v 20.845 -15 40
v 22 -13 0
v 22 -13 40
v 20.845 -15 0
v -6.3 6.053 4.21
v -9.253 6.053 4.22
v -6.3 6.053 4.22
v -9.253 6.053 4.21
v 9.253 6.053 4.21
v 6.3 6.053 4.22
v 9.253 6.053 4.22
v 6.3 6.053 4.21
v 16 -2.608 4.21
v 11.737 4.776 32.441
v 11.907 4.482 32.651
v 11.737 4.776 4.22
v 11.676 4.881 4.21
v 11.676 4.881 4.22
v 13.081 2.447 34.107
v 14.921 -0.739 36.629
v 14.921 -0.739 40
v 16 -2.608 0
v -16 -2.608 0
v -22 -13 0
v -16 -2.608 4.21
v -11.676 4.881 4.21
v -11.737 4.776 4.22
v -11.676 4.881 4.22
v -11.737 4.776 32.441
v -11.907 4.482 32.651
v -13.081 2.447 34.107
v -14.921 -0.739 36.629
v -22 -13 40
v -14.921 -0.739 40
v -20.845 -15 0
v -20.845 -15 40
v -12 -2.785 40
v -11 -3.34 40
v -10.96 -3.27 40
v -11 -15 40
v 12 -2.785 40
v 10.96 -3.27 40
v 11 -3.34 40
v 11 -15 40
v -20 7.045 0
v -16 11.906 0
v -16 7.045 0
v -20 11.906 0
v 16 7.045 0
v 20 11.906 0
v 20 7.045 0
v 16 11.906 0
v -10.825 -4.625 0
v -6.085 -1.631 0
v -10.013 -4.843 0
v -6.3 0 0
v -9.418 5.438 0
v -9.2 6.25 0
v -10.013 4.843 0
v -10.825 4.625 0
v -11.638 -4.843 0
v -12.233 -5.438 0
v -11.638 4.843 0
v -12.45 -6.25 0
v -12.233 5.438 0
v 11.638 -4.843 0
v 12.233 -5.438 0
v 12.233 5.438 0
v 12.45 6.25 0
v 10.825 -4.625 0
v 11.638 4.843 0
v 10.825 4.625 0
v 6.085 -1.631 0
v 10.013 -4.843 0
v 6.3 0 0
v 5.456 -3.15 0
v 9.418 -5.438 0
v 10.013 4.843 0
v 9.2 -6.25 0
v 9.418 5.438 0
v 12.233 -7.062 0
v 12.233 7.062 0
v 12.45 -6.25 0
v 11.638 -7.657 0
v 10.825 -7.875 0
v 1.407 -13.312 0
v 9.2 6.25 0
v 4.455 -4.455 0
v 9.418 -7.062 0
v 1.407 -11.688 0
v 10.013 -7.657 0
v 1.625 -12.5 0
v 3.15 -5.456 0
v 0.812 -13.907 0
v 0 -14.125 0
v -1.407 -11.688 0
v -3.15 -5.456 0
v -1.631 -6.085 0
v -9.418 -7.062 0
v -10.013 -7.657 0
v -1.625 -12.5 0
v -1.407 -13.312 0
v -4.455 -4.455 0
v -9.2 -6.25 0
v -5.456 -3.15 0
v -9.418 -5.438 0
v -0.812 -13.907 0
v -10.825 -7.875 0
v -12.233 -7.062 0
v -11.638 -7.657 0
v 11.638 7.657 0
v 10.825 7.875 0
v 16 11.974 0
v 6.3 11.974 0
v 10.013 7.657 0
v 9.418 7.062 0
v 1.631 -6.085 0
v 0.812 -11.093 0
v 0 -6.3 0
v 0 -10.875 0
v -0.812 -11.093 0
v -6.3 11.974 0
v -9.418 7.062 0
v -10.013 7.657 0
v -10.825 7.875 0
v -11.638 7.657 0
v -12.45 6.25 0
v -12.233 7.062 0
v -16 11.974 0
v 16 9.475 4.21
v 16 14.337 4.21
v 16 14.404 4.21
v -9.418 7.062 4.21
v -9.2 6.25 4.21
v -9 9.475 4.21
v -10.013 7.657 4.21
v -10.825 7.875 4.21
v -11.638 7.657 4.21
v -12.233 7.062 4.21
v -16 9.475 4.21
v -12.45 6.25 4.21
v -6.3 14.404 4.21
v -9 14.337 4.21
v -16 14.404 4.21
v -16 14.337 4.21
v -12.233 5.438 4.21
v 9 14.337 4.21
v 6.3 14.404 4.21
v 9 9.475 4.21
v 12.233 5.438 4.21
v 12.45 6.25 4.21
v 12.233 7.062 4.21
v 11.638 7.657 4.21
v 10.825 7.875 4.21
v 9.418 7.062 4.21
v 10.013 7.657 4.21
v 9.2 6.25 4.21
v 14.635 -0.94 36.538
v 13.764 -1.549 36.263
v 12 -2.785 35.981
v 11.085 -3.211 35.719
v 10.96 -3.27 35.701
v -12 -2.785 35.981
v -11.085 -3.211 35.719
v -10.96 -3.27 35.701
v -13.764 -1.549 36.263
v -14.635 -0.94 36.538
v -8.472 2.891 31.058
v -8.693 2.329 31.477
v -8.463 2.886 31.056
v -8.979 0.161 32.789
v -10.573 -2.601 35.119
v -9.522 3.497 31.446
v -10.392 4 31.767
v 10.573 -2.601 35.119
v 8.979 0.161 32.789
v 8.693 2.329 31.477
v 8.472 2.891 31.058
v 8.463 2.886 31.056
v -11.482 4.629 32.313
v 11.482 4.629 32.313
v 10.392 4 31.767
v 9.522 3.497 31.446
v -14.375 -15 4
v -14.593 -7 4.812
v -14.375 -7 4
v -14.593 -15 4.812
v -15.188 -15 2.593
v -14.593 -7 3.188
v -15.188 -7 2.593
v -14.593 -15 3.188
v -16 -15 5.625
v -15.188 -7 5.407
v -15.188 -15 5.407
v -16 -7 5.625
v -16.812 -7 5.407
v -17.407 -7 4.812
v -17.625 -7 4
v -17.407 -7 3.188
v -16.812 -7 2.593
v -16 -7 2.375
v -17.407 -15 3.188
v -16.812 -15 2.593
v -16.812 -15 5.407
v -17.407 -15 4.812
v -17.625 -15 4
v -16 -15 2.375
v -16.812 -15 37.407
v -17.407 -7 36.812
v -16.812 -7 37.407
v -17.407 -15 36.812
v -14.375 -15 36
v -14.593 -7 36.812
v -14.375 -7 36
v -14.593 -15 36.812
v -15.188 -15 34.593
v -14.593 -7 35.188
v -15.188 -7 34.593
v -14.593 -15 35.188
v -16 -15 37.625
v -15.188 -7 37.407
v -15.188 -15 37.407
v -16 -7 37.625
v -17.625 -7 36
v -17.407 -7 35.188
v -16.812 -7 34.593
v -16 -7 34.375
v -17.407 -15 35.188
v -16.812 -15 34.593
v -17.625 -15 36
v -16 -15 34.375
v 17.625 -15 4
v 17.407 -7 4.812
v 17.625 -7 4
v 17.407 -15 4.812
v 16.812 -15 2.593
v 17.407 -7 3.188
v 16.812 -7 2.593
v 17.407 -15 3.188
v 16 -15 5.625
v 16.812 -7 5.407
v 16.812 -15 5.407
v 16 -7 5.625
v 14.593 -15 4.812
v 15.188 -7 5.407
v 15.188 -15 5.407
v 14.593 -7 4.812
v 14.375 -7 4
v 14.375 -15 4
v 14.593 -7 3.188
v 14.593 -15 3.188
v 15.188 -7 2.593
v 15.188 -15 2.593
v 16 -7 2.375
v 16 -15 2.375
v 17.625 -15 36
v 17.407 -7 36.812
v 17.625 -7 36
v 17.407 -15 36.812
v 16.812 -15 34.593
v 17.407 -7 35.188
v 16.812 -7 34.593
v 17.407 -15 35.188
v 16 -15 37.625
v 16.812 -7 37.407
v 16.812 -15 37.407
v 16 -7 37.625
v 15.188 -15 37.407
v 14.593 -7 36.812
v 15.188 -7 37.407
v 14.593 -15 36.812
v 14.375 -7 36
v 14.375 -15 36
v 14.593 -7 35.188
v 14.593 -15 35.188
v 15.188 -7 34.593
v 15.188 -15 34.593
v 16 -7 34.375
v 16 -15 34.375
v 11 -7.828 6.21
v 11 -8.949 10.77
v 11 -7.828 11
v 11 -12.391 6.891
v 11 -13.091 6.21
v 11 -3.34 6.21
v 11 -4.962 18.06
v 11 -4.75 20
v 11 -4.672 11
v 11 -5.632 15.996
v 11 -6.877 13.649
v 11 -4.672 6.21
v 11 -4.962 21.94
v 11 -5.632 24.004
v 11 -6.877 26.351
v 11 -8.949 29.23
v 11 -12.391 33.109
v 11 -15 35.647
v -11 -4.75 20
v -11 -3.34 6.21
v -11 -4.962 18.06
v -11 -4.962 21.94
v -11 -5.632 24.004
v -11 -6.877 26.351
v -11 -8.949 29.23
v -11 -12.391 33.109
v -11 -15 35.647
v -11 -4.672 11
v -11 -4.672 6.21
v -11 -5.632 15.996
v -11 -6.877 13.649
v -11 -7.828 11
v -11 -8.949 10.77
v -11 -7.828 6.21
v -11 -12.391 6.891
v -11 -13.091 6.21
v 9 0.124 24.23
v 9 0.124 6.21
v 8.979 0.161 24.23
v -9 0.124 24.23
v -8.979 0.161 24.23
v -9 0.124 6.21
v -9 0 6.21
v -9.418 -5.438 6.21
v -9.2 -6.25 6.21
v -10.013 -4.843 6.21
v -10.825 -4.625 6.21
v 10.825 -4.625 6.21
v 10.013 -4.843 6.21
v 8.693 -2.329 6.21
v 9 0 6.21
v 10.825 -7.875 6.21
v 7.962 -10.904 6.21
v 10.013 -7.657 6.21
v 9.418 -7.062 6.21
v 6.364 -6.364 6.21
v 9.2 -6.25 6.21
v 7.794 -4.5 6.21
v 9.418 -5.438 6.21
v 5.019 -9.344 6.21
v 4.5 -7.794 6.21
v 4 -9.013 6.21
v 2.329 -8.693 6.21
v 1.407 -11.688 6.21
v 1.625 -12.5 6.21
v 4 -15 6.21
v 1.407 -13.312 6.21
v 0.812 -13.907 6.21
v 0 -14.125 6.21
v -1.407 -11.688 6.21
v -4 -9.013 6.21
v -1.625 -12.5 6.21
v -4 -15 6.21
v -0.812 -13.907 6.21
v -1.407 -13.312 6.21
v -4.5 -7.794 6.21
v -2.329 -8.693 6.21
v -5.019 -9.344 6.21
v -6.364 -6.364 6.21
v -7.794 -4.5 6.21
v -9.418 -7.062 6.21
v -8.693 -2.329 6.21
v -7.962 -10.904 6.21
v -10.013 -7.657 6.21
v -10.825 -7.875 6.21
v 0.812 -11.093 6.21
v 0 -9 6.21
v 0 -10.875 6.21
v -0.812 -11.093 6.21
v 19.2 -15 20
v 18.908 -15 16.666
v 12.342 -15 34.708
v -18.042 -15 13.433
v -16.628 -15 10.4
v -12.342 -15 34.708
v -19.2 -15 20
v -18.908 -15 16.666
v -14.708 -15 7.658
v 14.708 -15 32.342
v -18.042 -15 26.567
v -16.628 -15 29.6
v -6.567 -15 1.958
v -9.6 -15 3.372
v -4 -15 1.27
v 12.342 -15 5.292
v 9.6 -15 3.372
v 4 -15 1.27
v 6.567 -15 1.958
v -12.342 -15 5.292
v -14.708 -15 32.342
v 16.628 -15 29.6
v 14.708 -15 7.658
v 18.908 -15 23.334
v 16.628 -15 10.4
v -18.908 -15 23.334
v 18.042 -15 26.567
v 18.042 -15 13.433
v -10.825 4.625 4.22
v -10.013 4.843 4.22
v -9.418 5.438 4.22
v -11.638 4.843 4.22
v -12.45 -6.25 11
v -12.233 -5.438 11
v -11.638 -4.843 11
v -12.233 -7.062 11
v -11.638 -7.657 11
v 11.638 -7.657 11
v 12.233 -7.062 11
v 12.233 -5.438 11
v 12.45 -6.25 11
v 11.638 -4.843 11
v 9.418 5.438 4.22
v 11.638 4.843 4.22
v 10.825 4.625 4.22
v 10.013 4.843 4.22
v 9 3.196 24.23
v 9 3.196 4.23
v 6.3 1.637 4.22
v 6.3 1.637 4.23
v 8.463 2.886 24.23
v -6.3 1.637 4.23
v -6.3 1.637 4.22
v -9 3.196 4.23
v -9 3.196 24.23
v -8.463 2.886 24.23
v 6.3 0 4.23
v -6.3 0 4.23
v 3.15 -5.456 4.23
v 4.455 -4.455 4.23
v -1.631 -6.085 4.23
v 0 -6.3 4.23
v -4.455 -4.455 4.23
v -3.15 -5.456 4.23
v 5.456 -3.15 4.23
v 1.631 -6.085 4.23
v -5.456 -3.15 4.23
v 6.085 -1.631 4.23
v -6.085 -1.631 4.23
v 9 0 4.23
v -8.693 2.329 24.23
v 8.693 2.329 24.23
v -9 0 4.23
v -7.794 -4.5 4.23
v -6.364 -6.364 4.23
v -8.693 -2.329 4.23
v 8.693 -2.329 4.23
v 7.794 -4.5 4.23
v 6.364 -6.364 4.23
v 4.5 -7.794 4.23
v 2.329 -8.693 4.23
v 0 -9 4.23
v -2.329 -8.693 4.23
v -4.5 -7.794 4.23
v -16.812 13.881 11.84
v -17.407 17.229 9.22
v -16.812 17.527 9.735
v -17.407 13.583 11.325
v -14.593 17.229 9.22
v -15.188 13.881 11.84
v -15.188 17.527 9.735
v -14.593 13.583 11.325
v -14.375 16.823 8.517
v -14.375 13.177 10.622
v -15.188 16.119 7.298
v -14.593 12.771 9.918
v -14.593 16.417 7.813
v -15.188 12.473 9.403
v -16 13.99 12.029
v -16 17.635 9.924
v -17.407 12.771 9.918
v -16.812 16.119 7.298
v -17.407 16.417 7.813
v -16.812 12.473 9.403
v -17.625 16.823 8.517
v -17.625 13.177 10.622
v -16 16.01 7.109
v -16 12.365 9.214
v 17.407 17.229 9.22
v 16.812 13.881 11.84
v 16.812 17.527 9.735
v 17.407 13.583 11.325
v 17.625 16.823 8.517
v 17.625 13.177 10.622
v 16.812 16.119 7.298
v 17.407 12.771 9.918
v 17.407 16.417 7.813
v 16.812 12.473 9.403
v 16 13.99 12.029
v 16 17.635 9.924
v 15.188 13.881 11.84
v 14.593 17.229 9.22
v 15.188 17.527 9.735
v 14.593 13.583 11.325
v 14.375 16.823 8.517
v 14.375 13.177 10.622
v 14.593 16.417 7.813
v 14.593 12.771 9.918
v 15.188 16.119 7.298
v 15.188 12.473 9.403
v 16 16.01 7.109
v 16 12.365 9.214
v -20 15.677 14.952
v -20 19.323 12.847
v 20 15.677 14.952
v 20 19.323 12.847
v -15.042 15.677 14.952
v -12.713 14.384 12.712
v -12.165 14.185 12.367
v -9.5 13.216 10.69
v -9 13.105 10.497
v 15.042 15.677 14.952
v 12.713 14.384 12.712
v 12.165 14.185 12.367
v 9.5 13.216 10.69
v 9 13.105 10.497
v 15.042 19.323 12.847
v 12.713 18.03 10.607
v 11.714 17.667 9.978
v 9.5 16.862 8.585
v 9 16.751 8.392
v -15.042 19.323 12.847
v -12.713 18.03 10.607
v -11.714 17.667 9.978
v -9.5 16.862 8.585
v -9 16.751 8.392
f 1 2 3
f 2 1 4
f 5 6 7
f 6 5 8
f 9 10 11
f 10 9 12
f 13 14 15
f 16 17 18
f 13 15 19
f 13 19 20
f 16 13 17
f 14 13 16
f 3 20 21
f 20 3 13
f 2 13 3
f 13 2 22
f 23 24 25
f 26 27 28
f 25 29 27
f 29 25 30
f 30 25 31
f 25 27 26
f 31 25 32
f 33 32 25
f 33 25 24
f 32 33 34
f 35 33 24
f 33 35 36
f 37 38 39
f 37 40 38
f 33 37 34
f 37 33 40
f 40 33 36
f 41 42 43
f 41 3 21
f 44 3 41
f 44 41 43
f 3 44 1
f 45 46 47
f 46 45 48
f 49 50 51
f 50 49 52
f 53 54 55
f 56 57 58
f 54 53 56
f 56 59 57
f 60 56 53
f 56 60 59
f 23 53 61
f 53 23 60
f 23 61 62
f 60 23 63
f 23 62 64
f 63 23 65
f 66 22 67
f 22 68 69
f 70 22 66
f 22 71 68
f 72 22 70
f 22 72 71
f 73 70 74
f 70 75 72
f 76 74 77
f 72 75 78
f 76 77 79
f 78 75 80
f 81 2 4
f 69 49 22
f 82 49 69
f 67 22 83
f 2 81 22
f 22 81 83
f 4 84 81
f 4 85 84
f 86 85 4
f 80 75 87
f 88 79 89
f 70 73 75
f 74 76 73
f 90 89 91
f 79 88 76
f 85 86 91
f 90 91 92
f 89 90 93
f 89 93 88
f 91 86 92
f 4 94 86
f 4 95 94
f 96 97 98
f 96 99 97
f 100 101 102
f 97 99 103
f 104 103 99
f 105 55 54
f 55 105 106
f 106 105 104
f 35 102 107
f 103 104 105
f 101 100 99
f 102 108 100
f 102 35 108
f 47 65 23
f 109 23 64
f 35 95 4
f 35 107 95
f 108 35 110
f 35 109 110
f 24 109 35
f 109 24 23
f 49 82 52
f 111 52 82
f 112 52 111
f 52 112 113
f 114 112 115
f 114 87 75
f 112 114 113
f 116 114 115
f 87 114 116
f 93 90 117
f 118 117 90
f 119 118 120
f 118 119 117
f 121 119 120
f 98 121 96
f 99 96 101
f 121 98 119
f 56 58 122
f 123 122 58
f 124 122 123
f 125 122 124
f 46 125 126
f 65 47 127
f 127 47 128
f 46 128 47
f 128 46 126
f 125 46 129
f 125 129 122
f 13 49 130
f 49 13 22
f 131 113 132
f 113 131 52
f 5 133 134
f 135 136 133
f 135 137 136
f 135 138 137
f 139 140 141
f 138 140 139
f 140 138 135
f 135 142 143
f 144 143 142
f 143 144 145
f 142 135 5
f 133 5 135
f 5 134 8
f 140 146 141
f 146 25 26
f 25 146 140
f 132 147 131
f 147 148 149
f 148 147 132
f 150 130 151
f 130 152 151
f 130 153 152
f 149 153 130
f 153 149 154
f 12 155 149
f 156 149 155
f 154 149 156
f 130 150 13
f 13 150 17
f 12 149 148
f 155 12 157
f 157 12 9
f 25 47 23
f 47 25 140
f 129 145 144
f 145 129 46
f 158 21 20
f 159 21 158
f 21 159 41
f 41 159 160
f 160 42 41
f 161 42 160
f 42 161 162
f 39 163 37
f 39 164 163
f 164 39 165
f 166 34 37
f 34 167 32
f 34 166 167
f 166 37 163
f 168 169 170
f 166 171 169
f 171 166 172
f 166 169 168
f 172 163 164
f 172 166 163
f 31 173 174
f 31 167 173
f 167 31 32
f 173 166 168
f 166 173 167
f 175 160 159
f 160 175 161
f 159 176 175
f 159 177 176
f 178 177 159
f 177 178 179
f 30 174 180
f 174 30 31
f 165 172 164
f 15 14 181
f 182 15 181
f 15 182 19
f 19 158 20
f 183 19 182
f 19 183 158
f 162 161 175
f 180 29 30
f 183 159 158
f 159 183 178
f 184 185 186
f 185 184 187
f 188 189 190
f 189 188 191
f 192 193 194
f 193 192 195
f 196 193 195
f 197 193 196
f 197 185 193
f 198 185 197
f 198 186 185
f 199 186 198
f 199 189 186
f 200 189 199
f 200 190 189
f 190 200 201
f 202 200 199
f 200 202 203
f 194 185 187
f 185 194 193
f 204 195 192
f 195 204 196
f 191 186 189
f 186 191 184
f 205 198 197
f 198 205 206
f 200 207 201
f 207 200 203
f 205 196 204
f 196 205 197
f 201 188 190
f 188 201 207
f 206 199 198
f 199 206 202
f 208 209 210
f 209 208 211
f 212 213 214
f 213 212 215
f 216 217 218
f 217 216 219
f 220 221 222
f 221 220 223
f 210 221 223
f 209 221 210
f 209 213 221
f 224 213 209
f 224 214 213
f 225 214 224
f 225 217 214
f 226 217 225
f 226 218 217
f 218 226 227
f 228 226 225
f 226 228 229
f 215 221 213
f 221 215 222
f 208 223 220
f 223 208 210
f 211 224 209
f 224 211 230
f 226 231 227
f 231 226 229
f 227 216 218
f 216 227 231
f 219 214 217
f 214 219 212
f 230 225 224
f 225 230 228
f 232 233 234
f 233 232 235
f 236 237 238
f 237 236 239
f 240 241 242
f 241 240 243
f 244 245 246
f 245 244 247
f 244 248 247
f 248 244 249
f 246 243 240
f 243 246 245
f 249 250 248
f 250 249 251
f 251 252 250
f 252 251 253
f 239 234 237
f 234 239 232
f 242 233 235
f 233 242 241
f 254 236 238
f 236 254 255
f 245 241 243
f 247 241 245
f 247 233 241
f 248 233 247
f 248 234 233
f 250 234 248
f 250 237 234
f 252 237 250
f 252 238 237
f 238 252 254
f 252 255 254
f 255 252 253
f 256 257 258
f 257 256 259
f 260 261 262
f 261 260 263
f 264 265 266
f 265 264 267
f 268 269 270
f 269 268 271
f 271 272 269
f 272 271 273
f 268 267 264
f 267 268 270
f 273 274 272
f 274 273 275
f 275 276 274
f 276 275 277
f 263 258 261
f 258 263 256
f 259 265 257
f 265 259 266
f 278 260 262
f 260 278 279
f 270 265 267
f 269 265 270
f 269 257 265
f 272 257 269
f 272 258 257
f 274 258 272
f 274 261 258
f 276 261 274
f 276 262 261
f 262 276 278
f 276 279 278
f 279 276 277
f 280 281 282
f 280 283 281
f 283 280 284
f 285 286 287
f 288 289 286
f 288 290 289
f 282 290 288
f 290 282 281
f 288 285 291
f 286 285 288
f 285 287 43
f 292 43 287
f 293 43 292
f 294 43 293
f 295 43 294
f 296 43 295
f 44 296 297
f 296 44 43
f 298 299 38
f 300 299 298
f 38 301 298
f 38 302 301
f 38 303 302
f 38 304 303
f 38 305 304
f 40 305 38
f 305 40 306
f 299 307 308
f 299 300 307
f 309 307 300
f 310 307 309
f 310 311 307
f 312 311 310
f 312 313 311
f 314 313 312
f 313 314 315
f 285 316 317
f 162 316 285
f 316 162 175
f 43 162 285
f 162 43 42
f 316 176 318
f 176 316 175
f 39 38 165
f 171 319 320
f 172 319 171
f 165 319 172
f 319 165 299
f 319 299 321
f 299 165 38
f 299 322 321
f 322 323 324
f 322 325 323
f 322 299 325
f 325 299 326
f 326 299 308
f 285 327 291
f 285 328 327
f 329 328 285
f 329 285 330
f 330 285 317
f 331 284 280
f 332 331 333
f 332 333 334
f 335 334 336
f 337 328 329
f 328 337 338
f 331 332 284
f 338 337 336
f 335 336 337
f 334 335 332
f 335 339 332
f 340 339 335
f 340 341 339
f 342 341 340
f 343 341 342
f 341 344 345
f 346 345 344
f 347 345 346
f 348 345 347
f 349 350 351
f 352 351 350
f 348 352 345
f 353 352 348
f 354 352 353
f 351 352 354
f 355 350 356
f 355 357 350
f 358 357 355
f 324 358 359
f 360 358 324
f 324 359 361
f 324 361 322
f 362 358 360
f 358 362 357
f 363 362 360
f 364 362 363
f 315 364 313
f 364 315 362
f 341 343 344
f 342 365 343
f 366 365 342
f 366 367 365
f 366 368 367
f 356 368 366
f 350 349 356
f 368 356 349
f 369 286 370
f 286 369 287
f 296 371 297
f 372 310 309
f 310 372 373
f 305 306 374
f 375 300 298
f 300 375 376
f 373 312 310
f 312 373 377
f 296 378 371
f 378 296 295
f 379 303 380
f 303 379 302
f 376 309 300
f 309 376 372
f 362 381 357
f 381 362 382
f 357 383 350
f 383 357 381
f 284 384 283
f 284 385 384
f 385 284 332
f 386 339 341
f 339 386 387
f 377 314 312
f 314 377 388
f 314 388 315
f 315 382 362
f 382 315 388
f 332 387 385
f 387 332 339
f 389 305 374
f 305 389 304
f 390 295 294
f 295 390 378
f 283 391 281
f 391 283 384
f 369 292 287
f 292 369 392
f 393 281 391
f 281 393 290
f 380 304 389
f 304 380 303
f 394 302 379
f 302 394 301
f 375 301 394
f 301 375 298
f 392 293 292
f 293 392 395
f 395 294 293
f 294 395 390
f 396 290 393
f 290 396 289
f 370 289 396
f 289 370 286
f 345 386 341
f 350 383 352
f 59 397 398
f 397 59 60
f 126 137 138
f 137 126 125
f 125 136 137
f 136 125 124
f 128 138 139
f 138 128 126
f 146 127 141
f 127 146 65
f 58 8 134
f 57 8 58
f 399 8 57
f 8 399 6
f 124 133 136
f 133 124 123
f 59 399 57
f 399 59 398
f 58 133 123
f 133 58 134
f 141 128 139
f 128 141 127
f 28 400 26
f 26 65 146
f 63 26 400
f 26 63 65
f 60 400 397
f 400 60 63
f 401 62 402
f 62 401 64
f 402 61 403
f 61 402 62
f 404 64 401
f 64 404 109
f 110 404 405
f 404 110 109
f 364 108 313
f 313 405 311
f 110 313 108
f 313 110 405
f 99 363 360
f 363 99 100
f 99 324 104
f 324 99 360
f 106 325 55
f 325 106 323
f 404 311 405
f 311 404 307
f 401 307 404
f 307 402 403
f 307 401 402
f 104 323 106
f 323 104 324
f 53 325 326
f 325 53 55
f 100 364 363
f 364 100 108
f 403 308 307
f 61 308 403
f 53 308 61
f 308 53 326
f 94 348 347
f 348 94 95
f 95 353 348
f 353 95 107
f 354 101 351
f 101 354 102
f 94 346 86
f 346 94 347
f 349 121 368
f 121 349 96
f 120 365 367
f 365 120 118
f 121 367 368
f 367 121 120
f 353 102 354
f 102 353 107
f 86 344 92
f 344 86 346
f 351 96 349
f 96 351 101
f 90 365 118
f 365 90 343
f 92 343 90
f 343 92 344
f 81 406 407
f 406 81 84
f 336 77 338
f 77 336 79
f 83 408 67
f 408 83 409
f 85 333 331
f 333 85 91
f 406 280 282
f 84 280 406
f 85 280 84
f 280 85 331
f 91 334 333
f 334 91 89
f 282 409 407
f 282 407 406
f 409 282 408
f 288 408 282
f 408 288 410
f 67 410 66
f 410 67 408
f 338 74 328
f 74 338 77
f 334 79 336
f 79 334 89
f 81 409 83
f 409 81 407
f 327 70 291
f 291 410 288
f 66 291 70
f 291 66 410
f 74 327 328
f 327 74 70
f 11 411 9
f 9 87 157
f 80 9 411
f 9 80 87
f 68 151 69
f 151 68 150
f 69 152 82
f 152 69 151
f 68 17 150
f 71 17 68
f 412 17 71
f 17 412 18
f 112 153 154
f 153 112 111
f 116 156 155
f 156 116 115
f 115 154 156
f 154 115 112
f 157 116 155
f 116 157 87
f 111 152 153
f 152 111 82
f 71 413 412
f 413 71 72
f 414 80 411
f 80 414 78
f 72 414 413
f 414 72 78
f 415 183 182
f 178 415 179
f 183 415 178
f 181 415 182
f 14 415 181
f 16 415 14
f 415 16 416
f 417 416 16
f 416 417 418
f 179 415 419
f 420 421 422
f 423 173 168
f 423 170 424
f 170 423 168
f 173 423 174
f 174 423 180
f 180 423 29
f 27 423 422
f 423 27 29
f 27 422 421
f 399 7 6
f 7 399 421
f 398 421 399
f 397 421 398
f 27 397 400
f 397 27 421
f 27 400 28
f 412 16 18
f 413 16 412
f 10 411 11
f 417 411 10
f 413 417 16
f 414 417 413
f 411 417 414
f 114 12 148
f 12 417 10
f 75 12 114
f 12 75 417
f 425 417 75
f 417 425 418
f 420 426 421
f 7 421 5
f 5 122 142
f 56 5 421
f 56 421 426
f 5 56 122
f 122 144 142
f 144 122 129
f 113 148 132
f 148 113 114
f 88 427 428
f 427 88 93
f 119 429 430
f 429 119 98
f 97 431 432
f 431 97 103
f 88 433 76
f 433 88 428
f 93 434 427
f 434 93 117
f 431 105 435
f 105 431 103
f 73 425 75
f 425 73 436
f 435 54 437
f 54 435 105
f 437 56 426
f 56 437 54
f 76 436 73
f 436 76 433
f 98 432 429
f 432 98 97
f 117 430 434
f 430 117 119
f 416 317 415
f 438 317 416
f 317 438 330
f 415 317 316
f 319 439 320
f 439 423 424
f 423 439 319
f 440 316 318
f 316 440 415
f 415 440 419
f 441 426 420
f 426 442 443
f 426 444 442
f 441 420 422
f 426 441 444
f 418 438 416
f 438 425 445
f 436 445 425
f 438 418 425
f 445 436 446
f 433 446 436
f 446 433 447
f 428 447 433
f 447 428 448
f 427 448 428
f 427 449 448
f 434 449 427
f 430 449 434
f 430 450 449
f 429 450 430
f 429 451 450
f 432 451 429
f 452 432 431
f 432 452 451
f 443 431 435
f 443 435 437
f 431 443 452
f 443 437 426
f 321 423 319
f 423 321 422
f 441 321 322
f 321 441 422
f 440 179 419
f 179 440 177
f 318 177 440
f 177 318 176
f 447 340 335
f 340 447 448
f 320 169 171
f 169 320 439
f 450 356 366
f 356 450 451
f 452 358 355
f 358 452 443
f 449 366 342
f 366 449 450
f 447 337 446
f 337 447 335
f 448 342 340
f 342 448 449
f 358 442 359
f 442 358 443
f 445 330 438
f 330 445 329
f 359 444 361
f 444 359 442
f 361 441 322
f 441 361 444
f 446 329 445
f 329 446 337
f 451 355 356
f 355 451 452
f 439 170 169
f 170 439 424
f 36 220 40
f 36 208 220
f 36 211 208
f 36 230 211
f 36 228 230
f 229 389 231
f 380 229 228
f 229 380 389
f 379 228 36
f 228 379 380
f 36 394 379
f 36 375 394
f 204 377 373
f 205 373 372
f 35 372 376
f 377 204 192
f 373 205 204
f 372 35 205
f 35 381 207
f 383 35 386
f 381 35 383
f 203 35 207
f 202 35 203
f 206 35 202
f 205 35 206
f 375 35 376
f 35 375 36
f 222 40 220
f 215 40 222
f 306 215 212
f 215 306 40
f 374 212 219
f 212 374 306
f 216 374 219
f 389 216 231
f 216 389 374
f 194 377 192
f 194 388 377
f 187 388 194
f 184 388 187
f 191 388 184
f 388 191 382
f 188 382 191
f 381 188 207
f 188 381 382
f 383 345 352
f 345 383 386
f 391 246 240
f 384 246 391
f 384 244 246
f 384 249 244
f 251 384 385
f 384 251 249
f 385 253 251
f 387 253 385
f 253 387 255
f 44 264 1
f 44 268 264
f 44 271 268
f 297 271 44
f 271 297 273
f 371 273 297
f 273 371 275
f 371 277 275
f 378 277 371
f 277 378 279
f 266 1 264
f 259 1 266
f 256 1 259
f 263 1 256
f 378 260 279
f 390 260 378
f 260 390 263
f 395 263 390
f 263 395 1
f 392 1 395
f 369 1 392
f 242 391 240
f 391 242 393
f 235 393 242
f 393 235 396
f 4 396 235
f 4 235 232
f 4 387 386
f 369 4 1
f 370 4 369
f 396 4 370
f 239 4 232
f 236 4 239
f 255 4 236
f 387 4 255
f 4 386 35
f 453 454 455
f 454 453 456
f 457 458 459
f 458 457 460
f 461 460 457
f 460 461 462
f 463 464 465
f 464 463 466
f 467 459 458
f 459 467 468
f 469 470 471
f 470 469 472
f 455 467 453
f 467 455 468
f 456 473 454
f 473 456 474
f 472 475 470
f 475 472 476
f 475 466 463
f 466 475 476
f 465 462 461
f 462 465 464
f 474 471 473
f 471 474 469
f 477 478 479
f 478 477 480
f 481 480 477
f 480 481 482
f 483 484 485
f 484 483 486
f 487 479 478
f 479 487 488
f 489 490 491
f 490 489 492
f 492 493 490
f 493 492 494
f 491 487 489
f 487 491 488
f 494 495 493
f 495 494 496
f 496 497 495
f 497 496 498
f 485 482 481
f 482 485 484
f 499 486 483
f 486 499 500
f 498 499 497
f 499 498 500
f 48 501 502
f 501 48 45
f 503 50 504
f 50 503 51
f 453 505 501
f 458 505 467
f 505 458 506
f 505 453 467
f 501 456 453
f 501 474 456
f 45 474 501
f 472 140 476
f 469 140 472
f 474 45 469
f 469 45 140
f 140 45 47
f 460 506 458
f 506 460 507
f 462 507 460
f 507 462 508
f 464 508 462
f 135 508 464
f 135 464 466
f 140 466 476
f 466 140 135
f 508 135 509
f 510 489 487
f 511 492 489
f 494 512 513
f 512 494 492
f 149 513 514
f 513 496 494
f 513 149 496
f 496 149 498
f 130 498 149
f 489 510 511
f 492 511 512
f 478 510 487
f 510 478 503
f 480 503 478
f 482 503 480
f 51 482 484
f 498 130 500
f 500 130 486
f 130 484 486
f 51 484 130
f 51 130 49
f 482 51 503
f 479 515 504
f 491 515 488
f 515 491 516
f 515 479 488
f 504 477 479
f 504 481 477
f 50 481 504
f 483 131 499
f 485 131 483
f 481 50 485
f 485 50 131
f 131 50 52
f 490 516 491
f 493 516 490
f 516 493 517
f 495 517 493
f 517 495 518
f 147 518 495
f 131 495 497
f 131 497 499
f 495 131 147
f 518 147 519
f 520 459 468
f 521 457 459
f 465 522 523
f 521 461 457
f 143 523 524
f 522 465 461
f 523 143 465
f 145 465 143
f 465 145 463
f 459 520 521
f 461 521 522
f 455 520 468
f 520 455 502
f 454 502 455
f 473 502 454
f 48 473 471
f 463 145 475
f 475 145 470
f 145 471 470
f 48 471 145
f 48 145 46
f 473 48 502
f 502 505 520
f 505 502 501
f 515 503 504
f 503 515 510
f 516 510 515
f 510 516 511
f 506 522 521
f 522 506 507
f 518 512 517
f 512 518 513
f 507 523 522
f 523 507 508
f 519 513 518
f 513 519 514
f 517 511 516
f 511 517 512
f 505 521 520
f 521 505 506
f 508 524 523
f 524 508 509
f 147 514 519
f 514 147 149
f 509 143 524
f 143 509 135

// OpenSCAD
// file: configuration.scad
// Increase this if your slicer or printer make holes too tight.
extra_radius = 0.2;

// OpenBeam or Misumi. 15x15 mm or 20x20 mm
extrusion = 20;

// OD = outside diameter, corner to corner.
m3_nut_od = 6.1;
m3_nut_radius = m3_nut_od/2 + 0.2 + extra_radius;
m3_washer_radius = 3.5 + extra_radius;

// Major diameter of metric 3mm thread.
m3_major = 2.85;
m3_radius = m3_major/2 + extra_radius;
m3_wide_radius = m3_major/2 + extra_radius + 0.2;
m3_scs_head_clearance_radius=7/2;

// Major diameter of metric 4mm thread.
m4_major = 3.85;
m4_radius = m4_major/2 + extra_radius;
m4_wide_radius = m4_major/2 + extra_radius + 0.2;
m4_scs_head_clearance_radius=8.5/2;



//for chamfers to be added
chamfer_width=1.5;

// NEMA17 stepper motors.
motor_shaft_diameter = 5;
motor_shaft_radius = motor_shaft_diameter/2 + extra_radius;

// Frame brackets. M3x8mm screws work best with 3.6 mm brackets.
thickness = 3.6;

//extrusion specific settings

//Socket cap screws used to assemble the frame
frame_scs_radius= extrusion==15 ? m3_radius : m4_radius;
frame_scs_wide_radius= extrusion==15 ? m3_wide_radius : m4_wide_radius;
frame_scs_head_clearance_radius= extrusion==15 ? m3_scs_head_clearance_radius: m4_scs_head_clearance_radius;

//4.1 if extrusion_w=15 6.1 if extrusion_w=20
nut_t_r = extrusion==15 ? 4.1 : 6.1;

// Placement for the NEMA17 stepper motors.
motor_offset = extrusion==15 ? 44: 41.5; //44 for 15x15 49 for 20x20 with motor posn adjusted for duet
motor_length = 42;
// main file
//Adaptation of the orginal hotend fan mount for the mini Kossel
//Tony@think3dprint3d.com
//Gpl v3

include <configuration.scad>;

barrel_radius = 8;
barrel_height = 30;

groove_radius = 6.3;
groove_height = 4.21;

fan_offset = 15;

module hotend_fan() {
  difference() {
    union() {
      translate([0, 2 - fan_offset, 0])
        cylinder(r=22, h=40, $fn=6);
      translate([0, 2, groove_height/2])
        cube([32, 26, groove_height], center=true); //cube([32, 22, groove_height], center=true);
    }
    // Opposite side cutaway (outgoing airflow).
    translate([0, 38, groove_height + 0.01]) rotate([0, 0, 30])
      cylinder(r=40, h=200, $fn=6);
    // Groove mount insert slot.
    translate([0, 10, 0])
      cube([2*groove_radius, 20, 20], center=true);
    // Keep printed plastic away from the hotend.
    intersection() {
      translate([0, 18, 0]) rotate([0, 0, 30])
        cylinder(r=24, h=100, center=true, $fn=36); //cylinder(r=28, h=100, center=true, $fn=36);
      translate([0, 10, barrel_height-2]) // translate([0, 10, barrel_height-5])
        cylinder(r1=barrel_radius-1, r2=80, h=55, $fn=36); //cylinder(r1=barrel_radius-1, r2=100, h=55, $fn=36);
    }
    //angle for second fan mount
     translate([0, 28.2, groove_height/2+6]) rotate([60,0,0])
        cube([41, 40, 20], center=true); 
    // Groove mount.
    cylinder(r=groove_radius, h=200, center=true, $fn=24);
    translate([0, 10, 10+groove_height + 0.02])
      cube([2*(barrel_radius + 1), 20, 20],center=true);
    // J-Head barrel.
    translate([0, 0, groove_height + 0.02])
      cylinder(r=barrel_radius + 1, h=100, $fn=24);
    // Fan mounting surface and screws.
    translate([0, -50 - fan_offset, 0])
      cube([100, 100, 100], center=true);
    for (x = [-16, 16]) {
      for (z = [-16, 16]) {
        translate([x, -fan_offset, z+20]) rotate([90, 0, 0]) 
          cylinder(r=m3_radius, h=16, center=true, $fn=12);
      }
    }
    // Vertical inner space.
    intersection() {
      cube([22, 100, 100], center=true);
      translate([0, -12, groove_height + 2])
        cylinder(r=16, h=40, $fn=6);
    }
    // Air funnel.
    difference() {
      translate([0, -1 - fan_offset, 20]) rotate([-90, 0, 0])
        cylinder(r1=20, r2=0, h=25, $fn=36);
      cube([8, 40, 40], center=true);
    }
    for (a = [60:60:359]) {
      rotate([0, 0, a]) translate([0, 12.5, 5]) 
        cylinder(r=m3_radius, h=12, center=true, $fn=12);
    }
  }
  //second fan mount
  difference(){
     translate([0, 13, groove_height/2+4]) rotate([60,0,0])
        cube([40, 18, groove_height], center=true); 
	 //cutout for second fan
 	 translate([0, 30, 20]) rotate([60,0,0])
	 cylinder(r=19, h=30, center=true);
    // Groove mount insert slot.
    translate([0, 10, 0])
      cube([2*groove_radius, 20, 20], center=true);
    translate([0, 10, groove_height + 0.02])
      cube([2*(barrel_radius + 1), 20, 20], center=true);
   //smooth bottom
    translate([0, 0,-10])
      cube([50, 50, 20], center=true);
    //dont obstruct mountng holes
    for (a = [-60:120:60]) {
      rotate([0, 0, a]) translate([0, 12.5, 5]) 
        cylinder(r=m3_radius, h=12, center=true, $fn=12);
    }
    translate([0, 13, groove_height/2+4])
    rotate([-30,0,0])
	   for (x = [-16, 16]) {
        translate([x, 0, 4]) rotate([90, 0, 0]) 
          cylinder(r=m3_radius, h=16, center=true, $fn=12);
      }

  }
}

hotend_fan();
/*
// Hotend barrel.
translate([0, 0, groove_height]) %
  cylinder(r=barrel_radius, h=barrel_height);

// 40mm fan.
translate([0, -5 - fan_offset, 20]) % difference() {
  cube([40, 10, 40], center=true);
  rotate([90, 0, 0,]) cylinder(r=19, h=20, center=true);
}
// second40mm fan.

translate([0, 30, 20])
rotate([-30,0,0]) 
% difference() {
  cube([40, 10, 40], center=true);
  rotate([90, 0, 0,]) cylinder(r=19, h=20, center=true);
}*/
